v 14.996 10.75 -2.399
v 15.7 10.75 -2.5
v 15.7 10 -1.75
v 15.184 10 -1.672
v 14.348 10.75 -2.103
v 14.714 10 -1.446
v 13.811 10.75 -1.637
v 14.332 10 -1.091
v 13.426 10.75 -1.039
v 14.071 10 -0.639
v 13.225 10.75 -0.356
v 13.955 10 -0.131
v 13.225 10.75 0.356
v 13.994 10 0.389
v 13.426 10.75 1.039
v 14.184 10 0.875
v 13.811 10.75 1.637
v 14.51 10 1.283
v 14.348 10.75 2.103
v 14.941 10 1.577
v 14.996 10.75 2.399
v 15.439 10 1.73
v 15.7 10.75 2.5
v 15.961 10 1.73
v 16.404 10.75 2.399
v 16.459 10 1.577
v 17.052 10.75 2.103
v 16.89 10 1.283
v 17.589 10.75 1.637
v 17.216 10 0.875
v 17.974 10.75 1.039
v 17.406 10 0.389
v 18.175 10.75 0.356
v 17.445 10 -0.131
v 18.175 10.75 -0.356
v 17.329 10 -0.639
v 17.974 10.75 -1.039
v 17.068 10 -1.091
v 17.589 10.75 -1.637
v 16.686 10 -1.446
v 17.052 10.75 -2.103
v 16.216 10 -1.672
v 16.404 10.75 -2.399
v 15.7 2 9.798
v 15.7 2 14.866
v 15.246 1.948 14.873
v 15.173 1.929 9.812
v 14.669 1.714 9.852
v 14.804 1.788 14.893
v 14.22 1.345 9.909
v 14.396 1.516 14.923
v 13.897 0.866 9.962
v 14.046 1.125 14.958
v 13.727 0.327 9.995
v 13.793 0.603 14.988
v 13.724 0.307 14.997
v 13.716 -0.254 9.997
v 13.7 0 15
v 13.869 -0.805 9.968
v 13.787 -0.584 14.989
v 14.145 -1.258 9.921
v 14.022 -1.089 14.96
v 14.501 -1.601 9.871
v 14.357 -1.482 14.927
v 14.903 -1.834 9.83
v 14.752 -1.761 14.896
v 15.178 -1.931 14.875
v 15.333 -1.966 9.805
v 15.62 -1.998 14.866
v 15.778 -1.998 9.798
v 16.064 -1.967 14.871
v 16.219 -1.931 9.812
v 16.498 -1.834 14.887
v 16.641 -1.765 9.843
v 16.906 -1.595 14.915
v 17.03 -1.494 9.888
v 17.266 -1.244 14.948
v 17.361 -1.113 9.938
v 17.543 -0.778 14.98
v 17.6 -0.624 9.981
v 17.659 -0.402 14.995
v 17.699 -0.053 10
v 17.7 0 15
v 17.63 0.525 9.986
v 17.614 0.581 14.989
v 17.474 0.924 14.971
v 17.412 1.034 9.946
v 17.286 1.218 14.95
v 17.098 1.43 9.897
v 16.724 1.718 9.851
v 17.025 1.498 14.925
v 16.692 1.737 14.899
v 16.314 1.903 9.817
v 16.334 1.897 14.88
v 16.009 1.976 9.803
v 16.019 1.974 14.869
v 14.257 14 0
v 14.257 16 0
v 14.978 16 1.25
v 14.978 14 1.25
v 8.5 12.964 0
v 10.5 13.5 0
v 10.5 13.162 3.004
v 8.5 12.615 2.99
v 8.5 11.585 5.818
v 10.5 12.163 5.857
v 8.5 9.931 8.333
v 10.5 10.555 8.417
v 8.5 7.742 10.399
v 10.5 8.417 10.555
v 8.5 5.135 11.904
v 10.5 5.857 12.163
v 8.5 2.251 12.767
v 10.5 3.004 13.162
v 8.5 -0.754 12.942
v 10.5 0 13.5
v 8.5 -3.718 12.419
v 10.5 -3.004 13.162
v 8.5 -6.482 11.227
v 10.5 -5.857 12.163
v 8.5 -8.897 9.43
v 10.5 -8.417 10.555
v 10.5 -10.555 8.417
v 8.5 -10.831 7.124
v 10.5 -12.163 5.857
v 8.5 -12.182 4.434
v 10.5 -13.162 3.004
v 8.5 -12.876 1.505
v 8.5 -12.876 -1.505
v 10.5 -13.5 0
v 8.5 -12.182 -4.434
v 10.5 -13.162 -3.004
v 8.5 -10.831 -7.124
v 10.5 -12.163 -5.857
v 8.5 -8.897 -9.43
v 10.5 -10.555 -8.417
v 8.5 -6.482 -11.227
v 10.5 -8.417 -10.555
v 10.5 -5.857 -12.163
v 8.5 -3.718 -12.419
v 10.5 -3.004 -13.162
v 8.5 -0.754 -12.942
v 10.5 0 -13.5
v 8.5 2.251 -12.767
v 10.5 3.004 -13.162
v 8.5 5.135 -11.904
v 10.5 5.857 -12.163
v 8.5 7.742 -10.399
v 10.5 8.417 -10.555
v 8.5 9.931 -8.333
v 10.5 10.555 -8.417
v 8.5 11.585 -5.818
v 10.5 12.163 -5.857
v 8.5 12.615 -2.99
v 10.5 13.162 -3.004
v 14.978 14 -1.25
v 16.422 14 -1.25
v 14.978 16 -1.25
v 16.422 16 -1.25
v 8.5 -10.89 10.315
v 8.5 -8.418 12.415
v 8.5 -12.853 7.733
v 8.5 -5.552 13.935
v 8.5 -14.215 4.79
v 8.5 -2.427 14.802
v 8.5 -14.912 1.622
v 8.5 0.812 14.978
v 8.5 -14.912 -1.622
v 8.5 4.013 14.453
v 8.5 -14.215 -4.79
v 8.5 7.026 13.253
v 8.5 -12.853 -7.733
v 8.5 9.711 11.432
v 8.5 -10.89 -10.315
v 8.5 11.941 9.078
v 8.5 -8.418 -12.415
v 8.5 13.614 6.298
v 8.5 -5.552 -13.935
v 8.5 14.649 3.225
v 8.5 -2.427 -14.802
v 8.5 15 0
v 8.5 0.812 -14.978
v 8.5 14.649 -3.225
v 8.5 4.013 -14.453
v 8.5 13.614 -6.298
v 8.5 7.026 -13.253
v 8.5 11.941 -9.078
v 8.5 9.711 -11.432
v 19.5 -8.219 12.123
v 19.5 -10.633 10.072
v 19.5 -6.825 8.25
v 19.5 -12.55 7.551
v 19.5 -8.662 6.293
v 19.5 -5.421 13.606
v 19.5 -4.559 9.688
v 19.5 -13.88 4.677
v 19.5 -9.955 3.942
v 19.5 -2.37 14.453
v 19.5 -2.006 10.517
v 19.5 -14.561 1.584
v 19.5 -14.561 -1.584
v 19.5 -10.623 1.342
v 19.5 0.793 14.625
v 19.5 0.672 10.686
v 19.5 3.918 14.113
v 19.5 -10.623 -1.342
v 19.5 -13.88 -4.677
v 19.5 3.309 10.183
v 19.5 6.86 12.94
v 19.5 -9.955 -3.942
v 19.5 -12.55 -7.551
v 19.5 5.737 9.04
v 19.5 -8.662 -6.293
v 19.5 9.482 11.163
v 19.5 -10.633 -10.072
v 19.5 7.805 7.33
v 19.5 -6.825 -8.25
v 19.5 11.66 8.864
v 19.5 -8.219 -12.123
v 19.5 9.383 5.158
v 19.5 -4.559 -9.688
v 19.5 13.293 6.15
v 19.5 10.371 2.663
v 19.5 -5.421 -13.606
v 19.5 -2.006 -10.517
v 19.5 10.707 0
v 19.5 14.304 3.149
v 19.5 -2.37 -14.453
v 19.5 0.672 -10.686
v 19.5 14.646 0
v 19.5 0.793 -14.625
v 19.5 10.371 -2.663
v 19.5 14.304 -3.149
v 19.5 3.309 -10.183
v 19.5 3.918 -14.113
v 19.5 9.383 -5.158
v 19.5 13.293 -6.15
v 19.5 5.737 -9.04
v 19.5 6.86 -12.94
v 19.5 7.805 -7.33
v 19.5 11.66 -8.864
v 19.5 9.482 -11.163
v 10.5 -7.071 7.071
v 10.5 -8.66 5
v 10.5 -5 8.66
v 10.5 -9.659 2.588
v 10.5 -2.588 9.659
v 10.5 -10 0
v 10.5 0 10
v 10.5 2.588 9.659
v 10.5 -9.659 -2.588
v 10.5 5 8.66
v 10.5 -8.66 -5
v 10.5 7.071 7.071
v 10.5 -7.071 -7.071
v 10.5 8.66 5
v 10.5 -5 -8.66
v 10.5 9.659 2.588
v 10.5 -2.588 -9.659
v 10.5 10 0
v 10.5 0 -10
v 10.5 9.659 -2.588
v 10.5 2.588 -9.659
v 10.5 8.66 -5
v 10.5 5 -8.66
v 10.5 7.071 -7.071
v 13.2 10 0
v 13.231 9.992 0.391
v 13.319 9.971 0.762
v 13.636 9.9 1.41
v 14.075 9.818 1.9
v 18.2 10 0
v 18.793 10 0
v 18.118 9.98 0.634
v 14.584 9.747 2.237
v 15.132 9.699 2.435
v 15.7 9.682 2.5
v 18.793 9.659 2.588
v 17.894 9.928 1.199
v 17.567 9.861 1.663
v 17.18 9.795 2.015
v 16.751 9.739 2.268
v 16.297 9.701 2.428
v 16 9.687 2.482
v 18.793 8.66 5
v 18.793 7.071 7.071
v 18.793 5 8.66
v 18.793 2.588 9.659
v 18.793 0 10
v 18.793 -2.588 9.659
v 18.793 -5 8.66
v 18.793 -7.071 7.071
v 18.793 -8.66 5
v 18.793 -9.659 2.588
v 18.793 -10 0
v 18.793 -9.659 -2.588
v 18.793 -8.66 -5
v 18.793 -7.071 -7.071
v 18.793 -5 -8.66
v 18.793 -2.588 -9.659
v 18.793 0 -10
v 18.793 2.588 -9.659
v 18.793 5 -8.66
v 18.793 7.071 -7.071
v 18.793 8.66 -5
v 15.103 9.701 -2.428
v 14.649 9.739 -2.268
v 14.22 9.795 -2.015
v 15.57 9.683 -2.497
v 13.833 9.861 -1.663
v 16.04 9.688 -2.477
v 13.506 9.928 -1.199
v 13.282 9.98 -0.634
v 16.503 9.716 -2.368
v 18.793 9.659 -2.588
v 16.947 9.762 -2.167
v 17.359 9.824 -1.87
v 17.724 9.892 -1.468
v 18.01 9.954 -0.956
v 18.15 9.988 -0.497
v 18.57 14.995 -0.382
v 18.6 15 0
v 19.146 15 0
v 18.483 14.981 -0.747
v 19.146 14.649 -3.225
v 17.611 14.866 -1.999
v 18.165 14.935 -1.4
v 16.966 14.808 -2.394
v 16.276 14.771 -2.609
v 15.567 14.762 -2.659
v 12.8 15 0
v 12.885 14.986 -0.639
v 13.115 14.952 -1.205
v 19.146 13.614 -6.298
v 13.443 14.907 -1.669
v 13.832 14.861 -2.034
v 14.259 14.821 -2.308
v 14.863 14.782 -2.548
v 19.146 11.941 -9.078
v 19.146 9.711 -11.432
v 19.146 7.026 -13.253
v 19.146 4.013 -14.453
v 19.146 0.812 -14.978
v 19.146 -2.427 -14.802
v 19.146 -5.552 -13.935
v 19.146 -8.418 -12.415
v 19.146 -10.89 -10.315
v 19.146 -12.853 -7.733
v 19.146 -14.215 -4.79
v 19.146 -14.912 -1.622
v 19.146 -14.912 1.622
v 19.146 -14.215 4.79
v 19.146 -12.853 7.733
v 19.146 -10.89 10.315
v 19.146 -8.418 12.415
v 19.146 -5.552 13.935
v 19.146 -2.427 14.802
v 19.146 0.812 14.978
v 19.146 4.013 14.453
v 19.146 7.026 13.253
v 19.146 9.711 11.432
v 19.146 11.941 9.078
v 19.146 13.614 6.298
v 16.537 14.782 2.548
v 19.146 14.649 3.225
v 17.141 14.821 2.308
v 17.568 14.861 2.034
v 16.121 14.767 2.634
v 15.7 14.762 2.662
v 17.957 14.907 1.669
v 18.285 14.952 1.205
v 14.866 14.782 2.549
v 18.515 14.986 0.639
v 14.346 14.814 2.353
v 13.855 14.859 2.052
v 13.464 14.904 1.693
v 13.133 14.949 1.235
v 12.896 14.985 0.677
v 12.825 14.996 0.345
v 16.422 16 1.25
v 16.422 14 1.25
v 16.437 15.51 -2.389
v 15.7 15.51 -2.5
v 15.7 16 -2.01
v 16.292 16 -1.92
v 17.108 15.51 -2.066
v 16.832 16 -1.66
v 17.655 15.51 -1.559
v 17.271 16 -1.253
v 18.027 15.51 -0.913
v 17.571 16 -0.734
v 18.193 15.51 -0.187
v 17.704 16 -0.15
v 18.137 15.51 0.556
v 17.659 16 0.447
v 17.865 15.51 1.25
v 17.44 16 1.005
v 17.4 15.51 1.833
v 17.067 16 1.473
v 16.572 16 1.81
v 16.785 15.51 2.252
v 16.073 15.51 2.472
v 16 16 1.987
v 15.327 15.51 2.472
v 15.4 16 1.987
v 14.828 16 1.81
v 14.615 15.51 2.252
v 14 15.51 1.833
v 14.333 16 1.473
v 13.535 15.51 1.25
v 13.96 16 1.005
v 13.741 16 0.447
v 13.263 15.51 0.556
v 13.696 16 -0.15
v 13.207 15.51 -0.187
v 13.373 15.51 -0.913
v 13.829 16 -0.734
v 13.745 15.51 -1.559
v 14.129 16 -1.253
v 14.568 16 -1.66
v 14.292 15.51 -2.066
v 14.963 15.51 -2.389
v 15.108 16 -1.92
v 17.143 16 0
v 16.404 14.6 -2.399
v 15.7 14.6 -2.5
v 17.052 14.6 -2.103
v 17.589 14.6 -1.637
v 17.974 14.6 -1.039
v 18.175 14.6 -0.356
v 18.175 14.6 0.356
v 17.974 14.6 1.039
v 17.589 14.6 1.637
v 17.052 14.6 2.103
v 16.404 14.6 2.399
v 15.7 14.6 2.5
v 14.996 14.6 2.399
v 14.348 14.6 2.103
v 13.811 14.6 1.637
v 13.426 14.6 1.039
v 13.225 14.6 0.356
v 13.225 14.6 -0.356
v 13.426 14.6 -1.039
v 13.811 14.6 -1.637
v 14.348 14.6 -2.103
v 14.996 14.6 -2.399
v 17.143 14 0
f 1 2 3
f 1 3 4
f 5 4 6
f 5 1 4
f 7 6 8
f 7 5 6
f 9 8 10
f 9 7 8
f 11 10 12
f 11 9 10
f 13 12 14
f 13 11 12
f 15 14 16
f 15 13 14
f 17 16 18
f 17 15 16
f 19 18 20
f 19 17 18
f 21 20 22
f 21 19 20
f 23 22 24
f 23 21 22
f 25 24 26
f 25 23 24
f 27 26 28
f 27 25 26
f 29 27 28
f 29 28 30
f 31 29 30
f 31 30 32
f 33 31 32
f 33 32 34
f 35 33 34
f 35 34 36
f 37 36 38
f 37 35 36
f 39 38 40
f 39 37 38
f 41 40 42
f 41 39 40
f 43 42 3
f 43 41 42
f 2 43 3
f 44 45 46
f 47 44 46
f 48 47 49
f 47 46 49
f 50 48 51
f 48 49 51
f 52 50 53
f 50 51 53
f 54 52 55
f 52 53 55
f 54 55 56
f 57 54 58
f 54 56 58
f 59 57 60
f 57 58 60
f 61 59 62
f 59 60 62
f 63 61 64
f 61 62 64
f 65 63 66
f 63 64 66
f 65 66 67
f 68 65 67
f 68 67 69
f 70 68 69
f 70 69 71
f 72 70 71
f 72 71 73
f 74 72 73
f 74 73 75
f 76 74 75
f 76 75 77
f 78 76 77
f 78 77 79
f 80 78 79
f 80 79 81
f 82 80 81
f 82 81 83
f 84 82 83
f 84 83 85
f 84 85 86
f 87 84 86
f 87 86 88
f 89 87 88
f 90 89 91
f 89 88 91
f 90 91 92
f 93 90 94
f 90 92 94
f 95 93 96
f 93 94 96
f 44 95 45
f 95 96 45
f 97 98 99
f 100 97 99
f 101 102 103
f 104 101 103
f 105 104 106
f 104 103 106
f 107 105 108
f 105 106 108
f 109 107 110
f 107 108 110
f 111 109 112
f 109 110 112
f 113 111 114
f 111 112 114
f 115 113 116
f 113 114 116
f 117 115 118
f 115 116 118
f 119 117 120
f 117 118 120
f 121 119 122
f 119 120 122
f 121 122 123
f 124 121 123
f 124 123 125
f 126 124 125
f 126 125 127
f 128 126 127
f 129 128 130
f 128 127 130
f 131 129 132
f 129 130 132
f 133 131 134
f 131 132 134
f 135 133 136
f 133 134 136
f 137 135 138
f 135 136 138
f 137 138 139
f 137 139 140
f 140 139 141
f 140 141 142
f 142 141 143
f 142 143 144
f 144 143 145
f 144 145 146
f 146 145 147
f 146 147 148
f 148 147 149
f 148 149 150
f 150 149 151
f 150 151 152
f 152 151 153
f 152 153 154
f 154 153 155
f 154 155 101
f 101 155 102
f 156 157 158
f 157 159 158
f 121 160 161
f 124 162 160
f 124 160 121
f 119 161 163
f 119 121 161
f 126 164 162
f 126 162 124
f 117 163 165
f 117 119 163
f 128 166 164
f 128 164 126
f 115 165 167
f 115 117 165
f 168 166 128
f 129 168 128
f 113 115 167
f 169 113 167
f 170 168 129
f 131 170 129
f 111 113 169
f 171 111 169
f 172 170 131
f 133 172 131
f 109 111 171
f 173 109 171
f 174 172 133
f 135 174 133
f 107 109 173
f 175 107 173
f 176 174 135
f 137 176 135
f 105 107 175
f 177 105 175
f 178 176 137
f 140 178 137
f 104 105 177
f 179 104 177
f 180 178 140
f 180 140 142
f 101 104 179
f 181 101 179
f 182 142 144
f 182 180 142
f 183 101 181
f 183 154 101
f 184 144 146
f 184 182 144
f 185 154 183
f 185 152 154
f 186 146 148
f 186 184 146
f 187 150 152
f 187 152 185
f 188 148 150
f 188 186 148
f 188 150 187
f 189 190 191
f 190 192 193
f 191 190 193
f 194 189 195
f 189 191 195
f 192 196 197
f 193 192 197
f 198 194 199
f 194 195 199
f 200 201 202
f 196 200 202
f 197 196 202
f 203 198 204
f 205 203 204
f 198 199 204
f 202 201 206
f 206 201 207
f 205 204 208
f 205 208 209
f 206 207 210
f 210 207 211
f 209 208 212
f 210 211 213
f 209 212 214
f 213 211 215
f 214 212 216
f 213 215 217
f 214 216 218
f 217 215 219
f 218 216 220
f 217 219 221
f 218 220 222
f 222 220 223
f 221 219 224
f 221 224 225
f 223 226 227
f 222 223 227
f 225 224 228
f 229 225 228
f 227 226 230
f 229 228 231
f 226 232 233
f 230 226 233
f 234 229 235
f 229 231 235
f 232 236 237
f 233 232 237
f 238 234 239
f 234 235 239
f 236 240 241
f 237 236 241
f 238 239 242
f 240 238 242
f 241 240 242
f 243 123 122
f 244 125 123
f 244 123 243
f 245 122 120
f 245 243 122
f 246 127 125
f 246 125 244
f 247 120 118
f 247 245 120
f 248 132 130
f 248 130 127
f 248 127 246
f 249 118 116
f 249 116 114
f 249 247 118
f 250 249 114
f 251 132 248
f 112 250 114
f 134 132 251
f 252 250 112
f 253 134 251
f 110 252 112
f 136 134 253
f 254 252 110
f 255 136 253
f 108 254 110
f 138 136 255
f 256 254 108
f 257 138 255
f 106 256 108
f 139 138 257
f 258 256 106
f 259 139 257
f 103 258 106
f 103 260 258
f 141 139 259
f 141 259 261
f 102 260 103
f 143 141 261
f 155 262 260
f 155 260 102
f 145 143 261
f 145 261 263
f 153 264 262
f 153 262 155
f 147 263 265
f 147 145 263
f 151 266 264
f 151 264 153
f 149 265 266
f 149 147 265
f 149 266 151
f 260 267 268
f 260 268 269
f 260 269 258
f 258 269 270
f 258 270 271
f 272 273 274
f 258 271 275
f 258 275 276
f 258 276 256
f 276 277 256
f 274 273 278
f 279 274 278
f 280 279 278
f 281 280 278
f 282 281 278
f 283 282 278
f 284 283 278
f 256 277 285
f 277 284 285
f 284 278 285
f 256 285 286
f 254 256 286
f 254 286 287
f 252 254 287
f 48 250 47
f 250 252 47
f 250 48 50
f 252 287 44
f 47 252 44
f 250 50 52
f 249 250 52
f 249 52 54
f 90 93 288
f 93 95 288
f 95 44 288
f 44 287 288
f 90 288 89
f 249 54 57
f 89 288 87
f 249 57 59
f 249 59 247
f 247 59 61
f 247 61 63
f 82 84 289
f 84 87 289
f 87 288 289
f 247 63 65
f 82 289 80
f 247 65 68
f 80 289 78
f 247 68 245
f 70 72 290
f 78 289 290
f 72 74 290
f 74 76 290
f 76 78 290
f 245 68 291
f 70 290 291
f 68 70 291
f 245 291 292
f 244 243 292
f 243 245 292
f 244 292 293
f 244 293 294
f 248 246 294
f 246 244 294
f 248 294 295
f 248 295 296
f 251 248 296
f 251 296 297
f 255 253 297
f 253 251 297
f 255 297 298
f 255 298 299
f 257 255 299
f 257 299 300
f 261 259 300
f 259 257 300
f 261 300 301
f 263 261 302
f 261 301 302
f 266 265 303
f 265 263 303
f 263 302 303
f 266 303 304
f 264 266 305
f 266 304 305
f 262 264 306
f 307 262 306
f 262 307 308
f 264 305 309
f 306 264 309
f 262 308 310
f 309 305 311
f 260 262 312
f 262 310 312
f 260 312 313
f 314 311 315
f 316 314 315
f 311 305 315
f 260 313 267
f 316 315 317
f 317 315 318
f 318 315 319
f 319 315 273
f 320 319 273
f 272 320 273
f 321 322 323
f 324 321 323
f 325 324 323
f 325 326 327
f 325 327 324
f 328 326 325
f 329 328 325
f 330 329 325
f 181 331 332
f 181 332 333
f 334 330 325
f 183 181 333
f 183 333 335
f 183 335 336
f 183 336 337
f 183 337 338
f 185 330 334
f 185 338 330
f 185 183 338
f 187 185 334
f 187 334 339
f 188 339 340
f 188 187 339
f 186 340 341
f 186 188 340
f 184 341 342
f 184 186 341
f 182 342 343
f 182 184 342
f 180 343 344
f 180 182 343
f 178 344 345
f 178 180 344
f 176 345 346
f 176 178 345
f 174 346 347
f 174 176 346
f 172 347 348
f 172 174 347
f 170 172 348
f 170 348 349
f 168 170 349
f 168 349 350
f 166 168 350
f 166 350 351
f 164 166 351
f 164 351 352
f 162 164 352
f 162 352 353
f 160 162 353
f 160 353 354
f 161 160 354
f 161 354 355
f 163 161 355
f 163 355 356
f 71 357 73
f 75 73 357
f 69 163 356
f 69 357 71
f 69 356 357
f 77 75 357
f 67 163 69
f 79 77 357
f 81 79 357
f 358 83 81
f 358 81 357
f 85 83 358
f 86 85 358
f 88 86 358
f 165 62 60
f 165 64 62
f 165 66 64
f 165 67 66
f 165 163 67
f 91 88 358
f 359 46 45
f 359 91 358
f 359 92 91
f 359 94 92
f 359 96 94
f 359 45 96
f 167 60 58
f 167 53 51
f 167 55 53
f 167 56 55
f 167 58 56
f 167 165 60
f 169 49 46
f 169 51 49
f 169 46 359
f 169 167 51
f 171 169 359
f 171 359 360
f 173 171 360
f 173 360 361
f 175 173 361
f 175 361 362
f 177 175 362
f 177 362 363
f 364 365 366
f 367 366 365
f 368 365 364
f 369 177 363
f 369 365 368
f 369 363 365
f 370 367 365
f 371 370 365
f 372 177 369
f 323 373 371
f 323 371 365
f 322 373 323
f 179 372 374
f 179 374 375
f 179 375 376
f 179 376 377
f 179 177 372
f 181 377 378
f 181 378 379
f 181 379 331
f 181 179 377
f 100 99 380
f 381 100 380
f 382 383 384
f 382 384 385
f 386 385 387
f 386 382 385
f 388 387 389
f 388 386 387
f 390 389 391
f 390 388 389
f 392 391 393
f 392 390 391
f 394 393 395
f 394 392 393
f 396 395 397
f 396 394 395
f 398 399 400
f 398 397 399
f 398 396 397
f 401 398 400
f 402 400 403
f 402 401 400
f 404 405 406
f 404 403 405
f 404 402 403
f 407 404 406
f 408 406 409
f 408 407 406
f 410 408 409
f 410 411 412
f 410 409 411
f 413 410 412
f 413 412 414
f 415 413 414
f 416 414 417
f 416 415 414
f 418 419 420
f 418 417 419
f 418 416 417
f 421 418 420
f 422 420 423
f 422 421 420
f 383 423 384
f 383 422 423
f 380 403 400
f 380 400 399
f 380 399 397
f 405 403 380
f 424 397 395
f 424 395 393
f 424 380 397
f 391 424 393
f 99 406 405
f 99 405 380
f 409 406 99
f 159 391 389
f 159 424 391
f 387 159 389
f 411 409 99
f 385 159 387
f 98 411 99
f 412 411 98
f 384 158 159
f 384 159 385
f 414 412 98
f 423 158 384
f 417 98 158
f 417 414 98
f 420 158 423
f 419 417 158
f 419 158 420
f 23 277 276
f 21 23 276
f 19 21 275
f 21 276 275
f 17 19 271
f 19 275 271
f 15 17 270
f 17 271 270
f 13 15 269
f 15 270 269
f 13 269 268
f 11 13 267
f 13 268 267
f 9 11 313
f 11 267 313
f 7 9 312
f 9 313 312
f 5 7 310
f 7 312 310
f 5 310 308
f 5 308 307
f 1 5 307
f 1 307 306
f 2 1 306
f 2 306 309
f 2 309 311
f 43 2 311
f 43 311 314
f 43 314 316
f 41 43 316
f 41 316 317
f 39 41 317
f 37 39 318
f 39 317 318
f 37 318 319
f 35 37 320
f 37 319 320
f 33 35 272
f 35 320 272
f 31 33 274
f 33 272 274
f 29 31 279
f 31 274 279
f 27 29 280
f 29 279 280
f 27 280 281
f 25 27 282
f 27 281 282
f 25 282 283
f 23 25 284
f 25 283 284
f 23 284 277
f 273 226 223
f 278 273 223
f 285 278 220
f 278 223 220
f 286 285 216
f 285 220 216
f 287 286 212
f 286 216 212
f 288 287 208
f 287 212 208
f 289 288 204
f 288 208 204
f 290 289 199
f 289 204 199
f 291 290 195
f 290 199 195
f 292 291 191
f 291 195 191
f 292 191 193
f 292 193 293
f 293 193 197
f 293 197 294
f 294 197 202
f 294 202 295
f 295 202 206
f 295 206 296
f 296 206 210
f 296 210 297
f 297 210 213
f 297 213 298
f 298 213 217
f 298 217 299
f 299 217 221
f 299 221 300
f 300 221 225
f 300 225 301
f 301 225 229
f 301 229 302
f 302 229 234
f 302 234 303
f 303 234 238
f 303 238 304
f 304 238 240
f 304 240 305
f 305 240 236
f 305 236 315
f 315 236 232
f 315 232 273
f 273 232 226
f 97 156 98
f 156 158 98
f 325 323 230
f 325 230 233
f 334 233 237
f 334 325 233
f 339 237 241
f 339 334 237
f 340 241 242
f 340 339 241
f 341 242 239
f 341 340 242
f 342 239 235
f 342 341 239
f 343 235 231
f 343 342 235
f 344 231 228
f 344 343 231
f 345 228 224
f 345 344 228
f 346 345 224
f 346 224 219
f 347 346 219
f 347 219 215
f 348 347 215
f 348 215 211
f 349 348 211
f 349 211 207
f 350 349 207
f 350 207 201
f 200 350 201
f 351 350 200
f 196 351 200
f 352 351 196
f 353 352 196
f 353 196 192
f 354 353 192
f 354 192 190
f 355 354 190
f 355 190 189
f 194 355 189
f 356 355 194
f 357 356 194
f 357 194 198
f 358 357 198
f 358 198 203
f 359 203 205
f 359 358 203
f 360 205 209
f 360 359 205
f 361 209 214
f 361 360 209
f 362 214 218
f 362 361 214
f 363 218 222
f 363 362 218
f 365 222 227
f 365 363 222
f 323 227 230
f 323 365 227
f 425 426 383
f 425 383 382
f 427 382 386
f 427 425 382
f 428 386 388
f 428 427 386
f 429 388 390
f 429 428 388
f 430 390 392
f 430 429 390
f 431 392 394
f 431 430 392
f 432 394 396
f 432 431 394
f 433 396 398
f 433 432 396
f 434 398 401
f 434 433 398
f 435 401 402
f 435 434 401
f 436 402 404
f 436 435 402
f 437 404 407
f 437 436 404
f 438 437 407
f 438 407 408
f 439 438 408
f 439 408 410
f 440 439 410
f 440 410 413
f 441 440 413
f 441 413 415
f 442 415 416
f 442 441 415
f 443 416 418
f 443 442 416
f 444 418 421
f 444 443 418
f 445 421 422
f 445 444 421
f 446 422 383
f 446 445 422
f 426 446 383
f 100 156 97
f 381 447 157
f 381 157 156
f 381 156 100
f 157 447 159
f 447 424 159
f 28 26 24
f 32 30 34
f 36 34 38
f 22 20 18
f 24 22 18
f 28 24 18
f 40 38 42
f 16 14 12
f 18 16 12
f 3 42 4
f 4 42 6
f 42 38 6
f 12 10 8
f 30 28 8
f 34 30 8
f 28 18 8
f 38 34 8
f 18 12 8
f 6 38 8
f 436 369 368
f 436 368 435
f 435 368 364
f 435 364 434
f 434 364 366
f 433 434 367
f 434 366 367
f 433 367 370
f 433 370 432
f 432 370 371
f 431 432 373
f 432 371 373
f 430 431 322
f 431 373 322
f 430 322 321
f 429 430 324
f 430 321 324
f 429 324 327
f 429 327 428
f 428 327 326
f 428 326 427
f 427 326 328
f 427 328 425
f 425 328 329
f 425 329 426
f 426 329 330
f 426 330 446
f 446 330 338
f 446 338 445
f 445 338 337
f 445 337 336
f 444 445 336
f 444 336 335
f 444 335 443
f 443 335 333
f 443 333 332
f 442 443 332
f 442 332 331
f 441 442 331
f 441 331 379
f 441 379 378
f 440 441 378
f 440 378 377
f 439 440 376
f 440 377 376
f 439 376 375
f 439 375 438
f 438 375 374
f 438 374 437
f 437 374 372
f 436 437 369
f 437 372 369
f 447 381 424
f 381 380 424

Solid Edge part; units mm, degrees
sketch "Sketch1" plane through (0, 0, 0) normal (0, 0, 1) x (1, 0, 0)
  line L0 (8.5, 15) -> (8.5, 12.9641)
  line L1 (8.5, 12.9641) -> (10.5, 13.5)
  line L2 (10.5, 13.5) -> (10.5, 10)
  line L3 (10.5, 10) -> (18.7929, 10)
  line L4 (18.7929, 10) -> (19.5, 10.7071)
  line L5 (19.5, 10.7071) -> (19.5, 14.6464)
  line L6 (19.5, 14.6464) -> (19.1464, 15)
  line L7 (19.1464, 15) -> (8.5, 15)
revolve "RevolvedProtrusion1" add sketch "Sketch1" angle 360 about axis through (10.5, 0, 0) along (-1, 0, 0)
hole "Bohrung_1" at (15.7, 15, 0) direction (0, -1, 0) diameter 5 depth 5.8175 countersink diameter 5.8 countersink angle 90
hole "Bohrung_2" at (15.7, 0, 9.298) direction (0, 0, 1) diameter 4 depth 5.702
sketch "Sketch2" plane through (15.7, 0, 0) normal (1, 0, 0) x (0, 1, 0)
  line L0 (16, 0) -> (16, -2.0095)
  line L1 (16, -2.0095) -> (15.5095, -2.5)
  line L2 (15.5095, -2.5) -> (10.75, -2.5)
  line L3 (10.75, -2.5) -> (10, -1.75)
  line L4 (10, -1.75) -> (10, 0)
  line L5 (10, 0) -> (16, 0)
revolve "RevolvedProtrusion2" add sketch "Sketch2" angle 360 about axis through (15.7, 10, 0) along (0, 1, 0)
cosmetic_thread "Thread1" size "M5"
sketch "Sketch3" plane through (15.7, 16, 0) normal (0, 1, 0) x (-1, 0, 0)
  line L0 (-0.7217, 1.25) -> (-1.4434, 0)
  line L1 (-1.4434, 0) -> (-0.7217, -1.25)
  line L2 (-0.7217, -1.25) -> (0.7217, -1.25)
  line L3 (0.7217, -1.25) -> (1.4434, 0)
  line L4 (1.4434, 0) -> (0.7217, 1.25)
  line L5 (0.7217, 1.25) -> (-0.7217, 1.25)
extrude "Extrusionsausschnitt_1" cut sketch "Sketch3" against normal blind 2
properties part number "62599720_3"
